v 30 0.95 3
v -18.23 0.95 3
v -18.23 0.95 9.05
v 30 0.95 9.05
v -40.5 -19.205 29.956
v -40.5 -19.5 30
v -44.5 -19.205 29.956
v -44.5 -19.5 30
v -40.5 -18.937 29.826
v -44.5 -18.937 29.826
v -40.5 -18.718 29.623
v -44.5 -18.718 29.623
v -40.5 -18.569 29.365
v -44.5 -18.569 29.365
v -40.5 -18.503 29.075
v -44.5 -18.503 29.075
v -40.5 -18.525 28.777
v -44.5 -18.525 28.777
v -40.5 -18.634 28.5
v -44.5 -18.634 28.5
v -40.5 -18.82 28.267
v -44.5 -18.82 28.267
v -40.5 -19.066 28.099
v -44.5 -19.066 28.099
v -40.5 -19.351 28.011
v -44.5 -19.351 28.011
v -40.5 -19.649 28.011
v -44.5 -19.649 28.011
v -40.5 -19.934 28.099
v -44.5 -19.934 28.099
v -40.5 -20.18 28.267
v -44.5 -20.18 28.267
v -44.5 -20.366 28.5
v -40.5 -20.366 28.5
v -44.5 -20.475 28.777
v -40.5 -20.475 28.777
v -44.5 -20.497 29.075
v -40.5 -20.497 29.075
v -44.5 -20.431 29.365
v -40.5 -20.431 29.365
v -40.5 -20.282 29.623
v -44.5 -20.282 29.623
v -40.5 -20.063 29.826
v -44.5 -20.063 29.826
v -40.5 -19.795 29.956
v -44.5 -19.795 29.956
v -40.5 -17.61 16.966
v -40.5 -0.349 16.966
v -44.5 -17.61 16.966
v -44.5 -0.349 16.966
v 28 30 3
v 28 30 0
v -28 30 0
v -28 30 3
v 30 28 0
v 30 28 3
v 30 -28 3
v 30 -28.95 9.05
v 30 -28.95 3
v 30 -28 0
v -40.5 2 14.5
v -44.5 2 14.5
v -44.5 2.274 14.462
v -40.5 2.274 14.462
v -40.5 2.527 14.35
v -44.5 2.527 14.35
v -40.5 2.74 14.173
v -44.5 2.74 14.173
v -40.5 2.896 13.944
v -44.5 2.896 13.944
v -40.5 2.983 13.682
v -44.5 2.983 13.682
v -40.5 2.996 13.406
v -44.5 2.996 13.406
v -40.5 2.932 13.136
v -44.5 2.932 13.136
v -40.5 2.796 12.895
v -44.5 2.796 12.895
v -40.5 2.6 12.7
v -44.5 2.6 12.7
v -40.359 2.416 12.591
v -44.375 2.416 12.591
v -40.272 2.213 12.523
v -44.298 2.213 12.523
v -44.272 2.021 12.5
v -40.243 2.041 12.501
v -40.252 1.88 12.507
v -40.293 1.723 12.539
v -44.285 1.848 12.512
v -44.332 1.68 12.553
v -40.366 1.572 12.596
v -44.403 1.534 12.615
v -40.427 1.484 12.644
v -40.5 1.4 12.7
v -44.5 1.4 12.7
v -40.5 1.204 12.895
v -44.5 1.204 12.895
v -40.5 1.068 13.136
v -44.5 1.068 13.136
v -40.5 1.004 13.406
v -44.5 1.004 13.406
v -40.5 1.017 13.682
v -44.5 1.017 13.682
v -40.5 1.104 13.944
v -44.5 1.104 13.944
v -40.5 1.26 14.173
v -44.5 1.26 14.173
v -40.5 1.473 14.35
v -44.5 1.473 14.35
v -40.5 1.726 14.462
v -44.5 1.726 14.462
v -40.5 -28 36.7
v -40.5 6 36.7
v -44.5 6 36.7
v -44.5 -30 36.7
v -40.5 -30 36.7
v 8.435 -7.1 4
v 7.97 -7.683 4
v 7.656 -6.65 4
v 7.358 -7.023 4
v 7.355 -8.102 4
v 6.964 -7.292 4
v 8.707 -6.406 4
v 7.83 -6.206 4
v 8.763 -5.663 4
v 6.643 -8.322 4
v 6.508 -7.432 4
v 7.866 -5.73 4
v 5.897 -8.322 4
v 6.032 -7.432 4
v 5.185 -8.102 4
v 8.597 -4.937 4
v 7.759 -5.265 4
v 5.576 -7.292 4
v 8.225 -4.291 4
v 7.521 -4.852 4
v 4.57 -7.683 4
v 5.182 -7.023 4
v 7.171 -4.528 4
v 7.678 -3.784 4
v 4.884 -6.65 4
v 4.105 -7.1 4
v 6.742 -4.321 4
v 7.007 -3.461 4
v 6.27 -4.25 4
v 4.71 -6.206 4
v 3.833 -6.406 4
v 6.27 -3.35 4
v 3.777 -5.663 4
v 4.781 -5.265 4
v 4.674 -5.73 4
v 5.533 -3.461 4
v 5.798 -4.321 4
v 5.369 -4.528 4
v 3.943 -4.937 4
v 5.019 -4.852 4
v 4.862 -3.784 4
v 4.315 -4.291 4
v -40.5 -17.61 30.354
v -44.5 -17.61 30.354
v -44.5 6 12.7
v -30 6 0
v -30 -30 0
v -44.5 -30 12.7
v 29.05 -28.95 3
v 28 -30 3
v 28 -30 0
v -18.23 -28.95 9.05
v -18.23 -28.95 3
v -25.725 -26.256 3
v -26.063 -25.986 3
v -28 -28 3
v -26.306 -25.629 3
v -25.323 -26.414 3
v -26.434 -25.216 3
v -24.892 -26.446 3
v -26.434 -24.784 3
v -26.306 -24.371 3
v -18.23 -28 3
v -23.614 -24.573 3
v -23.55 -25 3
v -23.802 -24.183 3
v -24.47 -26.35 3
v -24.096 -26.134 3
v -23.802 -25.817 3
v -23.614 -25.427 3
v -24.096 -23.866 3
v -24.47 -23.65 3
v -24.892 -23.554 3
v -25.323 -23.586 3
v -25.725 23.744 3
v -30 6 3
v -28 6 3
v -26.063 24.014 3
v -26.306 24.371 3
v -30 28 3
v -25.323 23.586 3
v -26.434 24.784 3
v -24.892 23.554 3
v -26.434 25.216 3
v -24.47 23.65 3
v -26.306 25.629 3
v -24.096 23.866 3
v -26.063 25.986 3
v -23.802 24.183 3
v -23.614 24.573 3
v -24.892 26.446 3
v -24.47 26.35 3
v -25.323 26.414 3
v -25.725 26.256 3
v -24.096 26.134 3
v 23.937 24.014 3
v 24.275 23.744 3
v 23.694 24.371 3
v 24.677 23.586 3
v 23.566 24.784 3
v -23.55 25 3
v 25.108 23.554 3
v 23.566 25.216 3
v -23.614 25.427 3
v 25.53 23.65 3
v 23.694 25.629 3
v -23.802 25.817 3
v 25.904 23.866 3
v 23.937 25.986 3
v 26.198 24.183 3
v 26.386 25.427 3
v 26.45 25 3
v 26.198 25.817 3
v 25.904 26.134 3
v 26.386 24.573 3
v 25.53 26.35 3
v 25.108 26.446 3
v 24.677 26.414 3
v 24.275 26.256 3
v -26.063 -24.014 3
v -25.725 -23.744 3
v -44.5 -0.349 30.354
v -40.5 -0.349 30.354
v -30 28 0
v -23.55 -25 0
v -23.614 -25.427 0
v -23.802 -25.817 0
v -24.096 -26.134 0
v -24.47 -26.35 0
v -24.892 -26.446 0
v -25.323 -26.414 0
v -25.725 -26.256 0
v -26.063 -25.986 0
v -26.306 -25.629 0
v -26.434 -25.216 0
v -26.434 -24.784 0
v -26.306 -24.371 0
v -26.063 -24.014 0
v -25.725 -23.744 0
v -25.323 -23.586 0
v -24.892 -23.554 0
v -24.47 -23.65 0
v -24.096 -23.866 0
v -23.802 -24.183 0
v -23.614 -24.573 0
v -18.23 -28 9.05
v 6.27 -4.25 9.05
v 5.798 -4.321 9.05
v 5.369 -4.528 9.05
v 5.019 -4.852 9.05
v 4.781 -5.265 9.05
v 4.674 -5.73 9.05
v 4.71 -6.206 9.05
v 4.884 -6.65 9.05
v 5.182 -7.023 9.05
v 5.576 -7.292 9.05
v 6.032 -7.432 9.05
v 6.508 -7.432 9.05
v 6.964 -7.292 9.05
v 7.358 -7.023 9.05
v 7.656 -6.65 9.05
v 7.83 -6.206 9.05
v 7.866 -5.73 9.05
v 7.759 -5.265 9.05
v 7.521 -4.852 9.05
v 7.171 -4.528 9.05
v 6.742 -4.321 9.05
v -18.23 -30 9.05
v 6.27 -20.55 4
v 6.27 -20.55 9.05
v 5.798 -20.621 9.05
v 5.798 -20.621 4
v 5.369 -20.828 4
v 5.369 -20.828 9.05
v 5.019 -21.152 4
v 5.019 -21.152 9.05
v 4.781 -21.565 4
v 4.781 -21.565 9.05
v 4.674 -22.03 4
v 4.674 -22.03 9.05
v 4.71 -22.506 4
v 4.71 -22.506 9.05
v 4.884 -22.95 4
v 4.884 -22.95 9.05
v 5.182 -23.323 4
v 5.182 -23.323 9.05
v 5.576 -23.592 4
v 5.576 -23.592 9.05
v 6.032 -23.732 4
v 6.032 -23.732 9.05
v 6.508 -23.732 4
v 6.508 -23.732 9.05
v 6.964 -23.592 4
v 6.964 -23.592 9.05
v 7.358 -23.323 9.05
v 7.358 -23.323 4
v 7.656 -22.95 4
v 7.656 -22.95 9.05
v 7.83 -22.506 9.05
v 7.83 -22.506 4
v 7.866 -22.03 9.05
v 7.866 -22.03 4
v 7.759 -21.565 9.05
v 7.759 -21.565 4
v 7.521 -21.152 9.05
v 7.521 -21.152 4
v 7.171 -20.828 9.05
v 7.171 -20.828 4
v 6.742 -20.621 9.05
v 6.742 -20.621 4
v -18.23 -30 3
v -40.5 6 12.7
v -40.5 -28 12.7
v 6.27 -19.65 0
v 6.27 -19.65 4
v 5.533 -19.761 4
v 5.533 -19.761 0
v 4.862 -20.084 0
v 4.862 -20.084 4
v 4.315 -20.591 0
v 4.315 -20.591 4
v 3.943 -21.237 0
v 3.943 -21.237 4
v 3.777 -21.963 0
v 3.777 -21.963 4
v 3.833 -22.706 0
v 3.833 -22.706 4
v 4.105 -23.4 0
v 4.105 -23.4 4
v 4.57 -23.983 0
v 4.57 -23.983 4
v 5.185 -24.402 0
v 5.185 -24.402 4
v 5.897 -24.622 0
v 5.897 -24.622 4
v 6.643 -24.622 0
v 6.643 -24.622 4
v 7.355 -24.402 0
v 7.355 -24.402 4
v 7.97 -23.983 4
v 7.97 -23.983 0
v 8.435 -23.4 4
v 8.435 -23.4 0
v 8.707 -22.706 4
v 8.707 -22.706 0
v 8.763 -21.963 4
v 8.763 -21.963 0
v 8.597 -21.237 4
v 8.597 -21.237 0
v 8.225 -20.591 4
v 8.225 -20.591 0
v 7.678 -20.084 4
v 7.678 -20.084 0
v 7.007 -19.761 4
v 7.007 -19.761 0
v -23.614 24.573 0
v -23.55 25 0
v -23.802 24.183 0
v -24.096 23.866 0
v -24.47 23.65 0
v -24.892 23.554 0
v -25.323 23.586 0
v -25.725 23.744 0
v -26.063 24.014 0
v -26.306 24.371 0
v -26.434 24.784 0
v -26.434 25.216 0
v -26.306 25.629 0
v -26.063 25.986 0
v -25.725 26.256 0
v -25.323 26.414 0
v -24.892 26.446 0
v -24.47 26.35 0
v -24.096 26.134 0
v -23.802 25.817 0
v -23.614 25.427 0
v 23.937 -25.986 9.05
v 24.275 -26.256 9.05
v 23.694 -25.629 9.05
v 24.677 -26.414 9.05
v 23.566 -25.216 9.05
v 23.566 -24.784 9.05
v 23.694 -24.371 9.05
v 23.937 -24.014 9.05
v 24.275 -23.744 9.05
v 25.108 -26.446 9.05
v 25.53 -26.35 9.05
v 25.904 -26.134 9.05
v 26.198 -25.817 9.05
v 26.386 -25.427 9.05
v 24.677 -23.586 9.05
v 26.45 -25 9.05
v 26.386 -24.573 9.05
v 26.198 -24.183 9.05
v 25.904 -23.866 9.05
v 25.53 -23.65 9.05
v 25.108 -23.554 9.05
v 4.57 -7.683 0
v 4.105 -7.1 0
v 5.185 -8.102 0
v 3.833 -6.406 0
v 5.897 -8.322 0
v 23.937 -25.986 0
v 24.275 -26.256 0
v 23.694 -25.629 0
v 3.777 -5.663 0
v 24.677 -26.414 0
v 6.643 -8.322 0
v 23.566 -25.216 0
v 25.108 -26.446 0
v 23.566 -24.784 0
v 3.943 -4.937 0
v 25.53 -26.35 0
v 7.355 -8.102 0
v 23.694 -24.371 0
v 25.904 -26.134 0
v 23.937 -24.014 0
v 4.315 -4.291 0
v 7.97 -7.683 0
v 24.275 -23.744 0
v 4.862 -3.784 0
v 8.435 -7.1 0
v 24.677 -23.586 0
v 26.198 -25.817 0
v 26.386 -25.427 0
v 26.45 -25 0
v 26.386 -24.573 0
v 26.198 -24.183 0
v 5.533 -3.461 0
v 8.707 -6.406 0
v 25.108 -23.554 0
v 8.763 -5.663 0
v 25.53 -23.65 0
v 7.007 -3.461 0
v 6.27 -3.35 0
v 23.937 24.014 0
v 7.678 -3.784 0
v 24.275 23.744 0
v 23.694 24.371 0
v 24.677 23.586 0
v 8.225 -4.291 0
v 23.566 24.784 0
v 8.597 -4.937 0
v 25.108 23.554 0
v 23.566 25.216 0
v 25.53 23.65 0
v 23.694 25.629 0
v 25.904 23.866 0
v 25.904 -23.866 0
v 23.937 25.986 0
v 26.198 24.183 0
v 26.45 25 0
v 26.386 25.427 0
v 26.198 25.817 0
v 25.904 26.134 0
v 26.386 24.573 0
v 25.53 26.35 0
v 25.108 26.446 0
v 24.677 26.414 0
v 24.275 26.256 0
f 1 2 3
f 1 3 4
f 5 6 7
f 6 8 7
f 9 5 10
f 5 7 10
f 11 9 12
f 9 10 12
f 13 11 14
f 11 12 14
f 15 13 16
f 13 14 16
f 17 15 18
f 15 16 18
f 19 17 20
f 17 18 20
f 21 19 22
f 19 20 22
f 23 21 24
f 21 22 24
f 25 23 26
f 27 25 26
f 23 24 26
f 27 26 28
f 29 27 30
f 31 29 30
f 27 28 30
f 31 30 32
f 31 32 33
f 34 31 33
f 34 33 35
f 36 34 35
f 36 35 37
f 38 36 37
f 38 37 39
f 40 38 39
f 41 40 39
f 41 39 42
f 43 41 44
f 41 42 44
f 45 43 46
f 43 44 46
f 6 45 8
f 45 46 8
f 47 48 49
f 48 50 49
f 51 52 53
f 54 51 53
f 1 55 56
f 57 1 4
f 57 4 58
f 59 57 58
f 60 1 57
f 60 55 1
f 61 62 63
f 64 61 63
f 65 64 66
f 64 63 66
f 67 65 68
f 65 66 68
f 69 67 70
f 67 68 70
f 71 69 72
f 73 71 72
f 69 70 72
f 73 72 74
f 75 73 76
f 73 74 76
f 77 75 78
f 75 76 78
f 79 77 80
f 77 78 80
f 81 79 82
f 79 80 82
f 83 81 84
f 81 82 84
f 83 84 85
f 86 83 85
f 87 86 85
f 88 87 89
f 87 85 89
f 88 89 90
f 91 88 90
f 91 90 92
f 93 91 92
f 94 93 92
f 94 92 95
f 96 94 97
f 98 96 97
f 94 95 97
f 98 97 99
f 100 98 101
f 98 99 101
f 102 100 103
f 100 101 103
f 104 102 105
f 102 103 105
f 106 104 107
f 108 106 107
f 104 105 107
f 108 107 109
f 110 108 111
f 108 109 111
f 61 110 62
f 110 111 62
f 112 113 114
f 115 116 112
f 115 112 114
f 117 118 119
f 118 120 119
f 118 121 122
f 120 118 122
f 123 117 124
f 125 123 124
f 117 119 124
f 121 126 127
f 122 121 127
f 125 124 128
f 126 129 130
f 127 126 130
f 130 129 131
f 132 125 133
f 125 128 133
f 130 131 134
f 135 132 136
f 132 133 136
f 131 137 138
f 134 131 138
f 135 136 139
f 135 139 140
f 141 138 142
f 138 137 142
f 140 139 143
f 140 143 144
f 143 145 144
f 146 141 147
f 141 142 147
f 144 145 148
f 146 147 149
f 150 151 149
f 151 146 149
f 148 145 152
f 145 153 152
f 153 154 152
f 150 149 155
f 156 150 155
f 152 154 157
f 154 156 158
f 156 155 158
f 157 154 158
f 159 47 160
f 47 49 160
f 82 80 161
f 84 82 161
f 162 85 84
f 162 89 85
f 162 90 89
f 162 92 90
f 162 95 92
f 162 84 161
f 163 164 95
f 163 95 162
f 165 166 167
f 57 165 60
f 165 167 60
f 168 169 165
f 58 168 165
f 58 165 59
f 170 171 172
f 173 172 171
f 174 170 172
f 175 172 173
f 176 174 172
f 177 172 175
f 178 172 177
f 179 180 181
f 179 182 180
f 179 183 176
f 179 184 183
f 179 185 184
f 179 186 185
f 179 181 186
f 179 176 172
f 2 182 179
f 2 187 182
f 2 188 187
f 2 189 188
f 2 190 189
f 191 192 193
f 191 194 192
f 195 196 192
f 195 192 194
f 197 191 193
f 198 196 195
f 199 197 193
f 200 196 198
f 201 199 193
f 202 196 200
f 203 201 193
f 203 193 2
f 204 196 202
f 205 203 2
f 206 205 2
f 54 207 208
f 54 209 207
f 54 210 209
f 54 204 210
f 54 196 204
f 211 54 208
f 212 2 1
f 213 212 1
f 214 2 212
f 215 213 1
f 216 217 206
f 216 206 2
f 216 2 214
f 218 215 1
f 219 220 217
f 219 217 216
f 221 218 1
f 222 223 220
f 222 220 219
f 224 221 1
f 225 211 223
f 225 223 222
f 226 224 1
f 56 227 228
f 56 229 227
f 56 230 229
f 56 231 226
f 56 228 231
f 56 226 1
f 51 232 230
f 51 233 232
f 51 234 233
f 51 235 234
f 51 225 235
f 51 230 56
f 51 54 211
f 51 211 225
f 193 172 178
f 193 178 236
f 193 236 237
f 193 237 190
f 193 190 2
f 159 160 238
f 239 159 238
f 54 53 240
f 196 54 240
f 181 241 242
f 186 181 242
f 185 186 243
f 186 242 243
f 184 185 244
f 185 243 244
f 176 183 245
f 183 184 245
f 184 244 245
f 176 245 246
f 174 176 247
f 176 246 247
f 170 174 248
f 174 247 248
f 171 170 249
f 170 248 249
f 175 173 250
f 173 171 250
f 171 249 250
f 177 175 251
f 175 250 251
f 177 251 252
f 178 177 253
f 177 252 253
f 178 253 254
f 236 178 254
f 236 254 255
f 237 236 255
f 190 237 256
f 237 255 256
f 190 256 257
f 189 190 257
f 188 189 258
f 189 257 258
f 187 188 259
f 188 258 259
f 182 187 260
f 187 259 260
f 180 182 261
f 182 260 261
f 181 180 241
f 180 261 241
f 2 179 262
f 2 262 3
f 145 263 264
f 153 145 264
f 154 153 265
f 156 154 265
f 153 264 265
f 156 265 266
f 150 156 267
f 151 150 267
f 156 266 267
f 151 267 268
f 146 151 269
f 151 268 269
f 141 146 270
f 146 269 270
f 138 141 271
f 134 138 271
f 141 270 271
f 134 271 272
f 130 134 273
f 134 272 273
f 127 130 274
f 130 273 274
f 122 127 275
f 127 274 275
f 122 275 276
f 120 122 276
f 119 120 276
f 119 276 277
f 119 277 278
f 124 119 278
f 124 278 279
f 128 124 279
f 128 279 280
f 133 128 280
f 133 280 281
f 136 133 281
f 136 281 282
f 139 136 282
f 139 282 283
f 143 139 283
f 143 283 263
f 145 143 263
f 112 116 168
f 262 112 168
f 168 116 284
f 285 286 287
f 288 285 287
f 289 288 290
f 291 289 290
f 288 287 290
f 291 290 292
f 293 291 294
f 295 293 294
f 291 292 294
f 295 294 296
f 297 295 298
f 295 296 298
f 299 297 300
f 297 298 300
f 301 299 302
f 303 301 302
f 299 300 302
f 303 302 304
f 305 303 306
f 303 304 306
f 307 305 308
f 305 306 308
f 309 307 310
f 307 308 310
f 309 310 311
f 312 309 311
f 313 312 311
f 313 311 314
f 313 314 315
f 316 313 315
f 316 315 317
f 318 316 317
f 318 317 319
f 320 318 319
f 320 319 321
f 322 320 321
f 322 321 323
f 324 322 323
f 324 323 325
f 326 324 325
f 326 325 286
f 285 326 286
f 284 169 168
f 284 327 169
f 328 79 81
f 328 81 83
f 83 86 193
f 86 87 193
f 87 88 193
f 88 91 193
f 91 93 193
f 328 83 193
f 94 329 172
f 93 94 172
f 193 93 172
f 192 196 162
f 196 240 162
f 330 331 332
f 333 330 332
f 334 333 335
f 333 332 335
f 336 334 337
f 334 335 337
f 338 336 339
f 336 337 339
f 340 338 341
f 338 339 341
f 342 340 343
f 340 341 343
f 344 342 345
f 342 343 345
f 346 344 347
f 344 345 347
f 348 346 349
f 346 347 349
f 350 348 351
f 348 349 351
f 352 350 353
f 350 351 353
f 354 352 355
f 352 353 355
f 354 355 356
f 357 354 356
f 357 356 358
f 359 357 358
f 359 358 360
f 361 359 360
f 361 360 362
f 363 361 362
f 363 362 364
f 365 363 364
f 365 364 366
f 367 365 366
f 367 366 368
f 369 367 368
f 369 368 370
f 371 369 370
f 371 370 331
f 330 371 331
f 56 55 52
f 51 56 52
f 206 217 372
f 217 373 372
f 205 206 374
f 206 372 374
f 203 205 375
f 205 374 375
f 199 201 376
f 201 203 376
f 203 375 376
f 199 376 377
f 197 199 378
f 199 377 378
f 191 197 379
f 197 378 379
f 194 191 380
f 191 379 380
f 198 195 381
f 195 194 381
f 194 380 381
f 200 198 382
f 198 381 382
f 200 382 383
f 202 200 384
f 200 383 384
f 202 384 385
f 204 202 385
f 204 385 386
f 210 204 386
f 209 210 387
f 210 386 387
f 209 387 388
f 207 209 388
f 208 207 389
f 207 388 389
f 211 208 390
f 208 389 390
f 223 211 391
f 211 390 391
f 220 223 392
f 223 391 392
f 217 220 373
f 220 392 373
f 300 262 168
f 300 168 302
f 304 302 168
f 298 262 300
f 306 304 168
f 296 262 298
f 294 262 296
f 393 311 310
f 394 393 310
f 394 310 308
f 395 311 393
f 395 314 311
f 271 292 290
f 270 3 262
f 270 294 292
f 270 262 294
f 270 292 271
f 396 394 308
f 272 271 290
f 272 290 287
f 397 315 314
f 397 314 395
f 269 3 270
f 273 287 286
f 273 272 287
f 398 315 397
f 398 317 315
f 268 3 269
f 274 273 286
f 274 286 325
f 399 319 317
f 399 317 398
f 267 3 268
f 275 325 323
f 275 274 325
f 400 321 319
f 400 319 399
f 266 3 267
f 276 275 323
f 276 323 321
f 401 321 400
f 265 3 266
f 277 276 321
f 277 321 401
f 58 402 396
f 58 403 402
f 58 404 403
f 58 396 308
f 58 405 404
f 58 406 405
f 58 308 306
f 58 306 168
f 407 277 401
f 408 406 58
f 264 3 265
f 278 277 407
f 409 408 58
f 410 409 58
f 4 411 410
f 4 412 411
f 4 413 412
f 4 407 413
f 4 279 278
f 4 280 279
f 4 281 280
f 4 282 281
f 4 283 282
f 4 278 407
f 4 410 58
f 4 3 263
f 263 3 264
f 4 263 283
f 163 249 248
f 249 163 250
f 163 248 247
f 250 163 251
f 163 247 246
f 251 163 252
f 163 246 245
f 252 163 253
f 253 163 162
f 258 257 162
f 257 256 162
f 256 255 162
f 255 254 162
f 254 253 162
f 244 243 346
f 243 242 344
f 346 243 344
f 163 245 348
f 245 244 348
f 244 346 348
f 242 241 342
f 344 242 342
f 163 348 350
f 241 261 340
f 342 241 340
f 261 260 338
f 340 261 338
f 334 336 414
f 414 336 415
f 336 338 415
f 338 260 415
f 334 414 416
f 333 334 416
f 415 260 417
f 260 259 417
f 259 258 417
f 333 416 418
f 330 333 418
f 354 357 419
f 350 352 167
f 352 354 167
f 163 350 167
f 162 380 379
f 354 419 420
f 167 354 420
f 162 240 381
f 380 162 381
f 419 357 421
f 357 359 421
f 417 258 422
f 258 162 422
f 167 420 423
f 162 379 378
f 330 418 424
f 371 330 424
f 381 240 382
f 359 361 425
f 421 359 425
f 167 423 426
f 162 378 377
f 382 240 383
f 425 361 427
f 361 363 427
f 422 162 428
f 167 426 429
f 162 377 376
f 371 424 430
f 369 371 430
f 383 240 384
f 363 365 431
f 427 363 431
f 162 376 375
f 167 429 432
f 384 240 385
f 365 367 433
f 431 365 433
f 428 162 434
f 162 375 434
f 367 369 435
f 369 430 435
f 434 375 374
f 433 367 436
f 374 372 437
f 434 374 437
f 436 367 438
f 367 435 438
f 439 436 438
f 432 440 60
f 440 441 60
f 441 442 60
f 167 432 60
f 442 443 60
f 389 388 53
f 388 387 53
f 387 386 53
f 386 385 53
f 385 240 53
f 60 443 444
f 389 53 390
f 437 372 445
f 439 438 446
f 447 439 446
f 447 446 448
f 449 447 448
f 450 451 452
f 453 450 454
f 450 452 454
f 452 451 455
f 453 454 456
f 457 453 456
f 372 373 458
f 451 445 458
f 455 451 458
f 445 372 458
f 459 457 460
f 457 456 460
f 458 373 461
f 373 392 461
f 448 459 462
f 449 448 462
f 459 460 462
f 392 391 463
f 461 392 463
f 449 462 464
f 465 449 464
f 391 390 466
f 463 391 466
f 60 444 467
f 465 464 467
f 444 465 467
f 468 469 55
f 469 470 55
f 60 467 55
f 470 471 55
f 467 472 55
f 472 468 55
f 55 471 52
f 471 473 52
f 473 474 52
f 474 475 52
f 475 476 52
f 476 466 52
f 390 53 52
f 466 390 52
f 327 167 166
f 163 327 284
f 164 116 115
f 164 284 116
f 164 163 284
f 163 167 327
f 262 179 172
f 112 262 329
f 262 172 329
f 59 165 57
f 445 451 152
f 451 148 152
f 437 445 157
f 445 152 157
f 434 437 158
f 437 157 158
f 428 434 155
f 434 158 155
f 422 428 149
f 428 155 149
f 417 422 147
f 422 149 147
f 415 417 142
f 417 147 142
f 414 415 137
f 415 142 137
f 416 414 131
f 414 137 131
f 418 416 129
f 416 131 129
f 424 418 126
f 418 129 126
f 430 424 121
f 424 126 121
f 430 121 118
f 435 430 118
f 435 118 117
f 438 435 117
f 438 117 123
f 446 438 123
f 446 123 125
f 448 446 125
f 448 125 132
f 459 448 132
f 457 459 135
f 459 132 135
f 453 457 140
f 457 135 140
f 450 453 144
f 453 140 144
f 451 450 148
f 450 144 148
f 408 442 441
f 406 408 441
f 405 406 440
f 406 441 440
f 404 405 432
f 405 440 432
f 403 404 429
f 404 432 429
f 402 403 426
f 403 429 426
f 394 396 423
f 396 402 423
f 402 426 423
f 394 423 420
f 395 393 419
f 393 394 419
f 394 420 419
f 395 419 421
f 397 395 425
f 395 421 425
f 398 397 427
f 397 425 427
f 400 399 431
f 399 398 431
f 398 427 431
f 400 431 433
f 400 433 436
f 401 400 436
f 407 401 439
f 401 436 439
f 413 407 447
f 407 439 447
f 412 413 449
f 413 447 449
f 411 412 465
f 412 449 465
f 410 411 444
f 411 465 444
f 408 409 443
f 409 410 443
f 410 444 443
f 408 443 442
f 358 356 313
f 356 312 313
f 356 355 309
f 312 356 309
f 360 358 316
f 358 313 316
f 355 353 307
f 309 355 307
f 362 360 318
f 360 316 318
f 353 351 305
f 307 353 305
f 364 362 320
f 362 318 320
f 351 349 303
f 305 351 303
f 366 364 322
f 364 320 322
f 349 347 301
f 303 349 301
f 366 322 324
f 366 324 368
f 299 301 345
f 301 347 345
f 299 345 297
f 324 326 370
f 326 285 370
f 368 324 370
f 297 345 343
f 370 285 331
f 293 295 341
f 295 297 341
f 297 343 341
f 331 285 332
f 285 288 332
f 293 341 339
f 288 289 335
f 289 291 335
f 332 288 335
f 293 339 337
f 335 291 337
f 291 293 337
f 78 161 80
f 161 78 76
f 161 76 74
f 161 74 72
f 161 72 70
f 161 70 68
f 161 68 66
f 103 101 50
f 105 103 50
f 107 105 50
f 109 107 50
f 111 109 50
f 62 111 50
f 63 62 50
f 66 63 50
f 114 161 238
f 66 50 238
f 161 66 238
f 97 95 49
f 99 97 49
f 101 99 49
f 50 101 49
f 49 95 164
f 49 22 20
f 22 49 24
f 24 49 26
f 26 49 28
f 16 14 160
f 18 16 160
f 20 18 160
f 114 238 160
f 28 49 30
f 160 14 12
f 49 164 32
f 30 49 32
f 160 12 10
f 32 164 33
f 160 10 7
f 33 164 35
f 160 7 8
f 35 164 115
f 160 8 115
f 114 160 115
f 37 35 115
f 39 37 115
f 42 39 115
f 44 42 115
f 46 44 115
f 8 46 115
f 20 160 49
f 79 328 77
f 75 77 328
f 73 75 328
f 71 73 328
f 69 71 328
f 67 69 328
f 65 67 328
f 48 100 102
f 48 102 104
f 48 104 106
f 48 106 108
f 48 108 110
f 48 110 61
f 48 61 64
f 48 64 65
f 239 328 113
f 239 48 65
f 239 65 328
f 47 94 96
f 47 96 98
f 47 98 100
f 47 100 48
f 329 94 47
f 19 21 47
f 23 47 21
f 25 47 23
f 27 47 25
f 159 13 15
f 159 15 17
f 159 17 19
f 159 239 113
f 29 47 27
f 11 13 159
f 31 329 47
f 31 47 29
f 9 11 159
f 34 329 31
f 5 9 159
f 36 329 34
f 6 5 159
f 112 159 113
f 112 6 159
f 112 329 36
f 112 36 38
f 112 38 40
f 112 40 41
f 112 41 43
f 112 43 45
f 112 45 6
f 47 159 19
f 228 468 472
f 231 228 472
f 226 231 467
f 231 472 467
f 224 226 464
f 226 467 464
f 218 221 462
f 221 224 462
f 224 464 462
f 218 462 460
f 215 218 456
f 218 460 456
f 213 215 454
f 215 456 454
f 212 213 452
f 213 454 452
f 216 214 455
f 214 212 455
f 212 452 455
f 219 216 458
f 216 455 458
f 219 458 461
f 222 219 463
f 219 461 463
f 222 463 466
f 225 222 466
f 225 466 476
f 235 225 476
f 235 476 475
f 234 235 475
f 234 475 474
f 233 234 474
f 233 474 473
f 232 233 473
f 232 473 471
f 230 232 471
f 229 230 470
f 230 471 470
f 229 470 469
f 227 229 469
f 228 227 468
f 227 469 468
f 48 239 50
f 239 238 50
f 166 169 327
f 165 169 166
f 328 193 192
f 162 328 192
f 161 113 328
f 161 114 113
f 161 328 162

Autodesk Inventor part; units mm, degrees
ref_plane "Work Plane1" through (0, 0, 0) normal (0, 0, 1) x (1, 0, 0)
sketch "Sketch1" plane through (0, 0, 0) normal (0, 0, 1) x (1, 0, 0)
  circle A0 centre (0, 25) radius 1.95 construction
  circle A1 centre (-25, 0) radius 1.95 construction
  circle A2 centre (-25, -25) radius 1.95 construction
  circle A3 centre (25, 25) radius 1.95 construction
  circle A4 centre (25, -25) radius 1.95 construction
  circle A5 centre (-25, 25) radius 1.95 construction
  circle A6 centre (25, 0) radius 1.95 construction
  circle A7 centre (0, -25) radius 1.95 construction
  line L0 (-28, 30) -> (-30, 28) projected
  line L1 (-30, 28) -> (-30, -28) projected
  line L2 (-30, -28) -> (-28, -30) projected
  line L3 (-28, -30) -> (28, -30) projected
  line L4 (28, -30) -> (30, -28) projected
  line L5 (30, -28) -> (30, 28) projected
  line L6 (30, 28) -> (28, 30) projected
  line L7 (28, 30) -> (-28, 30) projected
  circle A8 centre (25, 25) radius 1.45
  circle A9 centre (25, -25) radius 1.45
  circle A10 centre (-25, -25) radius 1.45
  circle A11 centre (-25, 25) radius 1.45
  circle A12 centre (0, 25) radius 1.95 projected
  circle A13 centre (-25, 0) radius 1.95 projected
  circle A14 centre (-25, -25) radius 1.95 projected
  circle A15 centre (25, 25) radius 1.95 projected
  circle A16 centre (25, -25) radius 1.95 projected
  circle A17 centre (-25, 25) radius 1.95 projected
  circle A18 centre (25, 0) radius 1.95 projected
  circle A19 centre (0, -25) radius 1.95 projected
  line L8 (-28, 30) -> (-30, 28) projected
  line L9 (-30, 28) -> (-30, -28) projected
  line L10 (-30, -28) -> (-28, -30) projected
  line L11 (-28, -30) -> (28, -30) projected
  line L12 (28, -30) -> (30, -28) projected
  line L13 (30, -28) -> (30, 28) projected
  line L14 (30, 28) -> (28, 30) projected
  line L15 (28, 30) -> (-28, 30) projected
  line L16 (-44.5, 28.8555) -> (-44.5, 2)
  line L17 (-44.5, 34) -> (-45.5, 34)
  line L18 (-45.5, 1) -> (-44.5, 1)
  line L19 (-44.5, 34) -> (-30, 34)
  line L20 (-30, 34) -> (-30, 1)
  line L21 (-30, 1) -> (-44.5, 1)
  line L22 (-44.5, 1) -> (-44.5, 34)
  line L23 (-30, 34) -> (-26, 30)
  line L24 (-30, 34) -> (-24.3431, 34) construction
  point P0 (0, 0)
  dimension "d0" = 2.9
  dimension "d1" = 2.9
  dimension "d2" = 2.9
  dimension "d3" = 2.9
  dimension "d6" = 45
ref_plane "Work Plane2" through (-18, -2, 8) normal (0, 0, -1) x (0, 1, 0)
extrude "Extrusion1" add sketch "Sketch1" along normal blind 3 contours L7 L6 L5 L4 L3 L2 L1 L0 | A12 | A13 | A14 | A15 | A16 | A17 | A18 | A19
sketch "Sketch2" plane through (0, 0, 3) normal (0, 0, 1) x (1, 0, 0)
  arc A0 (7.0684, -7) -> (5.4716, -7) centre (6.27, -5.85) ccw
  arc A1 (5.4716, -21) -> (7.0684, -21) centre (6.27, -22.15) ccw
  line L0 (-18.23, -28.95) -> (30, -28.95)
  line L1 (-18.23, 0.95) -> (30, 0.95)
  line L2 (-18.23, 0.95) -> (30, 0.95)
  line L3 (30, 0.95) -> (30, -28.95)
  line L4 (30, -28.95) -> (-18.23, -28.95)
  line L5 (-18.23, -28.95) -> (-18.23, 0.95)
  circle A2 centre (6.27, -5.85) radius 1.4
  circle A3 centre (6.27, -22.15) radius 1.4
  circle A4 centre (25, -25) radius 1.45 projected
  point P0 (0, 0)
ref_plane "Work Plane3" through (-18, -2, 8) normal (0, 0, -1) x (0, 1, 0)
ref_plane "Work Plane6" through (-18.23, -26.95, 9.05) normal (0, 0, -1) x (0, 1, 0)
extrude "Extrusion2" add sketch "Sketch2" along normal up to surface (6.05 mm away)
sketch "Sketch3" plane through (0, 0, 0) normal (0, 0, -1) x (-1, 0, 0)
  line L0 (-30, -28.95) -> (-30, 0.95) projected
  line L1 (18.23, -28.95) -> (-30, -28.95) projected
  line L2 (-30, 0.95) -> (18.23, 0.95) projected
  line L3 (18.23, 0.95) -> (18.23, -28.95) projected
  arc A0 (-5.4716, -7) -> (-7.0684, -7) centre (-6.27, -5.85) ccw
  arc A1 (-7.0684, -21) -> (-5.4716, -21) centre (-6.27, -22.15) ccw
  point P0 (0, 0)
hole "Hole2" at (6.27, -22.15, 0) at (6.27, -5.85, 0) direction (0, 0, 1) diameter 3.2 depth 20 tip angle 118 counterbore diameter 5 counterbore depth 4
ref_plane "Work Plane4" through (-44.5, 34, 36.7) normal (0, 1, 0) x (0, 0, -1)
sketch "Sketch5" plane through (-44.5, -30, 36.7) normal (0, 1, 0) x (0, 0, -1)
  line L0 (36.7, -72.5) -> (36.7, -16.5) projected
  line L1 (36.7, -16.5) -> (33.7, -16.5) projected
  line L2 (33.7, -72.5) -> (33.7, -16.5) projected
  line L3 (36.7, -72.5) -> (33.7, -72.5) projected
  line L4 (25.7, 0) -> (0, 0) projected
  line L5 (25.7, 0) -> (25.7, 1) projected
  line L6 (0, 1) -> (25.7, 1) projected
  line L7 (0, 0) -> (0, 1) projected
  line L8 (0, 0) -> (24, 0)
  line L9 (24, 0) -> (24, -4)
  line L10 (24, -4) -> (0, -4)
  line L11 (0, -4) -> (0, 0)
  line L12 (24, -4) -> (33.7, -16.5)
  line L13 (36.7, -16.5) -> (36.7, -14.5) projected
  line L14 (36.7, -14.5) -> (36.7, -16.5) projected
  line L15 (24, 0) -> (36.7, -14.5)
  line L16 (36.7, -16.5) -> (33.7, -16.5) projected
  line L17 (36.7, -14.5) -> (36.7, -16.5)
  point P0 (36.7, -44.5)
  dimension "d23" = 24
  dimension "d24" = 4
ref_plane "Work Plane5" through (-45.5, 1, 28.397) normal (0, -1, 0) x (1, 0, 0)
extrude "Extrusion3" add sketch "Sketch5" along normal up to surface (36 mm away) contours L1 L12 L9 L15 L13 | L10 L11 L4 L9
sketch "Sketch6" plane through (-44.5, -30, 36.7) normal (0, -1, 0) x (-1, 0, 0)
  line L0 (-14.5, 36.7) -> (-72.5, 36.7) projected
  line L1 (-72.5, 36.7) -> (-72.5, 33.7) projected
  line L2 (-16.5, 33.7) -> (-72.5, 33.7) projected
  line L3 (-16.5, 33.7) -> (-4, 24) projected
  line L4 (-4, 24) -> (-4, 0) projected
  line L5 (-4, 0) -> (0, 0) projected
  line L6 (0, 0) -> (0, 24) projected
  line L7 (0, 24) -> (-14.5, 36.7) projected
  line L8 (-26.27, 27.65) -> (-74.5, 27.65) projected
  line L9 (-26.27, 33.7) -> (-26.27, 27.65) projected
  line L10 (-73.55, 33.7) -> (-26.27, 33.7) projected
  line L11 (-73.55, 33.7) -> (-74.5, 33.7) projected
  line L12 (-74.5, 33.7) -> (-74.5, 27.65) projected
  line L13 (-74.5, 27.65) -> (-26.27, 27.65) projected
  line L14 (-4, 0) -> (-26.27, 27.65)
  line L15 (-26.27, 33.7) -> (-26.27, 27.65) projected
  line L16 (-26.27, 27.65) -> (-26.27, 33.7)
  line L17 (-26.27, 33.7) -> (-16.5, 33.7)
  line L18 (-16.5, 33.7) -> (-4, 24)
  line L19 (-4, 24) -> (-4, 0)
  point P0 (-44.5, 36.7)
extrude "Extrusion4" add sketch "Sketch6" against normal blind 2 contours L2 L3 L4 L14 L9
sketch "Sketch7" plane through (-44.5, 6, 36.7) normal (-1, 0, 0) x (0, 0, 1)
  circle A0 centre (-2.7, 2.5) radius 1
  circle A1 centre (-7.7, -25.5) radius 1
  circle A2 centre (-23.2, -4) radius 1
  circle A3 centre (-12.7, -15) radius 2.6486
  line L0 (-6.3458, -6.3489) -> (-19.7341, -6.3489)
  line L1 (-19.7341, -6.3489) -> (-19.7341, -23.6095)
  line L2 (-19.7341, -23.6095) -> (-6.3458, -23.6095)
  line L3 (-6.3458, -23.6095) -> (-6.3458, -6.3489)
extrude "Extrusion5" cut sketch "Sketch7" against normal through all contours A0 | A1 | A2 | A3 | L3 L2 L1 L0
sketch "Sketch8" plane through (0, 0, 0) normal (0, 0, -1) x (-1, 0, 0)
  line L0 (-28, 30) -> (28, 30) projected
  line L1 (-30, 28) -> (-28, 30) projected
  line L2 (-30, -28) -> (-30, 28) projected
  line L3 (-28, -30) -> (-30, -28) projected
  line L4 (30, 28) -> (30, 6) projected
  line L5 (30, 6) -> (30, -30) projected
  line L6 (30, -30) -> (-28, -30) projected
  circle A0 centre (25, -25) radius 1.45 projected
  circle A1 centre (-25, 25) radius 1.45 projected
  circle A2 centre (-25, -25) radius 1.45 projected
  circle A3 centre (25, 25) radius 1.45 projected
  line L7 (71, -30) -> (71, -28) projected
  line L8 (71, -30) -> (131, 30)
  line L9 (71, -30) -> (155.8528, -30) construction
  line L10 (-28, 30) -> (28, 30) projected
  line L11 (28, 30) -> (30, 28) projected
  point P0 (0, 0)
  dimension "d31" = 135
extrude "Extrusion6" [suppressed]
properties part number "cellSTORM_inverted_Laser_left"
